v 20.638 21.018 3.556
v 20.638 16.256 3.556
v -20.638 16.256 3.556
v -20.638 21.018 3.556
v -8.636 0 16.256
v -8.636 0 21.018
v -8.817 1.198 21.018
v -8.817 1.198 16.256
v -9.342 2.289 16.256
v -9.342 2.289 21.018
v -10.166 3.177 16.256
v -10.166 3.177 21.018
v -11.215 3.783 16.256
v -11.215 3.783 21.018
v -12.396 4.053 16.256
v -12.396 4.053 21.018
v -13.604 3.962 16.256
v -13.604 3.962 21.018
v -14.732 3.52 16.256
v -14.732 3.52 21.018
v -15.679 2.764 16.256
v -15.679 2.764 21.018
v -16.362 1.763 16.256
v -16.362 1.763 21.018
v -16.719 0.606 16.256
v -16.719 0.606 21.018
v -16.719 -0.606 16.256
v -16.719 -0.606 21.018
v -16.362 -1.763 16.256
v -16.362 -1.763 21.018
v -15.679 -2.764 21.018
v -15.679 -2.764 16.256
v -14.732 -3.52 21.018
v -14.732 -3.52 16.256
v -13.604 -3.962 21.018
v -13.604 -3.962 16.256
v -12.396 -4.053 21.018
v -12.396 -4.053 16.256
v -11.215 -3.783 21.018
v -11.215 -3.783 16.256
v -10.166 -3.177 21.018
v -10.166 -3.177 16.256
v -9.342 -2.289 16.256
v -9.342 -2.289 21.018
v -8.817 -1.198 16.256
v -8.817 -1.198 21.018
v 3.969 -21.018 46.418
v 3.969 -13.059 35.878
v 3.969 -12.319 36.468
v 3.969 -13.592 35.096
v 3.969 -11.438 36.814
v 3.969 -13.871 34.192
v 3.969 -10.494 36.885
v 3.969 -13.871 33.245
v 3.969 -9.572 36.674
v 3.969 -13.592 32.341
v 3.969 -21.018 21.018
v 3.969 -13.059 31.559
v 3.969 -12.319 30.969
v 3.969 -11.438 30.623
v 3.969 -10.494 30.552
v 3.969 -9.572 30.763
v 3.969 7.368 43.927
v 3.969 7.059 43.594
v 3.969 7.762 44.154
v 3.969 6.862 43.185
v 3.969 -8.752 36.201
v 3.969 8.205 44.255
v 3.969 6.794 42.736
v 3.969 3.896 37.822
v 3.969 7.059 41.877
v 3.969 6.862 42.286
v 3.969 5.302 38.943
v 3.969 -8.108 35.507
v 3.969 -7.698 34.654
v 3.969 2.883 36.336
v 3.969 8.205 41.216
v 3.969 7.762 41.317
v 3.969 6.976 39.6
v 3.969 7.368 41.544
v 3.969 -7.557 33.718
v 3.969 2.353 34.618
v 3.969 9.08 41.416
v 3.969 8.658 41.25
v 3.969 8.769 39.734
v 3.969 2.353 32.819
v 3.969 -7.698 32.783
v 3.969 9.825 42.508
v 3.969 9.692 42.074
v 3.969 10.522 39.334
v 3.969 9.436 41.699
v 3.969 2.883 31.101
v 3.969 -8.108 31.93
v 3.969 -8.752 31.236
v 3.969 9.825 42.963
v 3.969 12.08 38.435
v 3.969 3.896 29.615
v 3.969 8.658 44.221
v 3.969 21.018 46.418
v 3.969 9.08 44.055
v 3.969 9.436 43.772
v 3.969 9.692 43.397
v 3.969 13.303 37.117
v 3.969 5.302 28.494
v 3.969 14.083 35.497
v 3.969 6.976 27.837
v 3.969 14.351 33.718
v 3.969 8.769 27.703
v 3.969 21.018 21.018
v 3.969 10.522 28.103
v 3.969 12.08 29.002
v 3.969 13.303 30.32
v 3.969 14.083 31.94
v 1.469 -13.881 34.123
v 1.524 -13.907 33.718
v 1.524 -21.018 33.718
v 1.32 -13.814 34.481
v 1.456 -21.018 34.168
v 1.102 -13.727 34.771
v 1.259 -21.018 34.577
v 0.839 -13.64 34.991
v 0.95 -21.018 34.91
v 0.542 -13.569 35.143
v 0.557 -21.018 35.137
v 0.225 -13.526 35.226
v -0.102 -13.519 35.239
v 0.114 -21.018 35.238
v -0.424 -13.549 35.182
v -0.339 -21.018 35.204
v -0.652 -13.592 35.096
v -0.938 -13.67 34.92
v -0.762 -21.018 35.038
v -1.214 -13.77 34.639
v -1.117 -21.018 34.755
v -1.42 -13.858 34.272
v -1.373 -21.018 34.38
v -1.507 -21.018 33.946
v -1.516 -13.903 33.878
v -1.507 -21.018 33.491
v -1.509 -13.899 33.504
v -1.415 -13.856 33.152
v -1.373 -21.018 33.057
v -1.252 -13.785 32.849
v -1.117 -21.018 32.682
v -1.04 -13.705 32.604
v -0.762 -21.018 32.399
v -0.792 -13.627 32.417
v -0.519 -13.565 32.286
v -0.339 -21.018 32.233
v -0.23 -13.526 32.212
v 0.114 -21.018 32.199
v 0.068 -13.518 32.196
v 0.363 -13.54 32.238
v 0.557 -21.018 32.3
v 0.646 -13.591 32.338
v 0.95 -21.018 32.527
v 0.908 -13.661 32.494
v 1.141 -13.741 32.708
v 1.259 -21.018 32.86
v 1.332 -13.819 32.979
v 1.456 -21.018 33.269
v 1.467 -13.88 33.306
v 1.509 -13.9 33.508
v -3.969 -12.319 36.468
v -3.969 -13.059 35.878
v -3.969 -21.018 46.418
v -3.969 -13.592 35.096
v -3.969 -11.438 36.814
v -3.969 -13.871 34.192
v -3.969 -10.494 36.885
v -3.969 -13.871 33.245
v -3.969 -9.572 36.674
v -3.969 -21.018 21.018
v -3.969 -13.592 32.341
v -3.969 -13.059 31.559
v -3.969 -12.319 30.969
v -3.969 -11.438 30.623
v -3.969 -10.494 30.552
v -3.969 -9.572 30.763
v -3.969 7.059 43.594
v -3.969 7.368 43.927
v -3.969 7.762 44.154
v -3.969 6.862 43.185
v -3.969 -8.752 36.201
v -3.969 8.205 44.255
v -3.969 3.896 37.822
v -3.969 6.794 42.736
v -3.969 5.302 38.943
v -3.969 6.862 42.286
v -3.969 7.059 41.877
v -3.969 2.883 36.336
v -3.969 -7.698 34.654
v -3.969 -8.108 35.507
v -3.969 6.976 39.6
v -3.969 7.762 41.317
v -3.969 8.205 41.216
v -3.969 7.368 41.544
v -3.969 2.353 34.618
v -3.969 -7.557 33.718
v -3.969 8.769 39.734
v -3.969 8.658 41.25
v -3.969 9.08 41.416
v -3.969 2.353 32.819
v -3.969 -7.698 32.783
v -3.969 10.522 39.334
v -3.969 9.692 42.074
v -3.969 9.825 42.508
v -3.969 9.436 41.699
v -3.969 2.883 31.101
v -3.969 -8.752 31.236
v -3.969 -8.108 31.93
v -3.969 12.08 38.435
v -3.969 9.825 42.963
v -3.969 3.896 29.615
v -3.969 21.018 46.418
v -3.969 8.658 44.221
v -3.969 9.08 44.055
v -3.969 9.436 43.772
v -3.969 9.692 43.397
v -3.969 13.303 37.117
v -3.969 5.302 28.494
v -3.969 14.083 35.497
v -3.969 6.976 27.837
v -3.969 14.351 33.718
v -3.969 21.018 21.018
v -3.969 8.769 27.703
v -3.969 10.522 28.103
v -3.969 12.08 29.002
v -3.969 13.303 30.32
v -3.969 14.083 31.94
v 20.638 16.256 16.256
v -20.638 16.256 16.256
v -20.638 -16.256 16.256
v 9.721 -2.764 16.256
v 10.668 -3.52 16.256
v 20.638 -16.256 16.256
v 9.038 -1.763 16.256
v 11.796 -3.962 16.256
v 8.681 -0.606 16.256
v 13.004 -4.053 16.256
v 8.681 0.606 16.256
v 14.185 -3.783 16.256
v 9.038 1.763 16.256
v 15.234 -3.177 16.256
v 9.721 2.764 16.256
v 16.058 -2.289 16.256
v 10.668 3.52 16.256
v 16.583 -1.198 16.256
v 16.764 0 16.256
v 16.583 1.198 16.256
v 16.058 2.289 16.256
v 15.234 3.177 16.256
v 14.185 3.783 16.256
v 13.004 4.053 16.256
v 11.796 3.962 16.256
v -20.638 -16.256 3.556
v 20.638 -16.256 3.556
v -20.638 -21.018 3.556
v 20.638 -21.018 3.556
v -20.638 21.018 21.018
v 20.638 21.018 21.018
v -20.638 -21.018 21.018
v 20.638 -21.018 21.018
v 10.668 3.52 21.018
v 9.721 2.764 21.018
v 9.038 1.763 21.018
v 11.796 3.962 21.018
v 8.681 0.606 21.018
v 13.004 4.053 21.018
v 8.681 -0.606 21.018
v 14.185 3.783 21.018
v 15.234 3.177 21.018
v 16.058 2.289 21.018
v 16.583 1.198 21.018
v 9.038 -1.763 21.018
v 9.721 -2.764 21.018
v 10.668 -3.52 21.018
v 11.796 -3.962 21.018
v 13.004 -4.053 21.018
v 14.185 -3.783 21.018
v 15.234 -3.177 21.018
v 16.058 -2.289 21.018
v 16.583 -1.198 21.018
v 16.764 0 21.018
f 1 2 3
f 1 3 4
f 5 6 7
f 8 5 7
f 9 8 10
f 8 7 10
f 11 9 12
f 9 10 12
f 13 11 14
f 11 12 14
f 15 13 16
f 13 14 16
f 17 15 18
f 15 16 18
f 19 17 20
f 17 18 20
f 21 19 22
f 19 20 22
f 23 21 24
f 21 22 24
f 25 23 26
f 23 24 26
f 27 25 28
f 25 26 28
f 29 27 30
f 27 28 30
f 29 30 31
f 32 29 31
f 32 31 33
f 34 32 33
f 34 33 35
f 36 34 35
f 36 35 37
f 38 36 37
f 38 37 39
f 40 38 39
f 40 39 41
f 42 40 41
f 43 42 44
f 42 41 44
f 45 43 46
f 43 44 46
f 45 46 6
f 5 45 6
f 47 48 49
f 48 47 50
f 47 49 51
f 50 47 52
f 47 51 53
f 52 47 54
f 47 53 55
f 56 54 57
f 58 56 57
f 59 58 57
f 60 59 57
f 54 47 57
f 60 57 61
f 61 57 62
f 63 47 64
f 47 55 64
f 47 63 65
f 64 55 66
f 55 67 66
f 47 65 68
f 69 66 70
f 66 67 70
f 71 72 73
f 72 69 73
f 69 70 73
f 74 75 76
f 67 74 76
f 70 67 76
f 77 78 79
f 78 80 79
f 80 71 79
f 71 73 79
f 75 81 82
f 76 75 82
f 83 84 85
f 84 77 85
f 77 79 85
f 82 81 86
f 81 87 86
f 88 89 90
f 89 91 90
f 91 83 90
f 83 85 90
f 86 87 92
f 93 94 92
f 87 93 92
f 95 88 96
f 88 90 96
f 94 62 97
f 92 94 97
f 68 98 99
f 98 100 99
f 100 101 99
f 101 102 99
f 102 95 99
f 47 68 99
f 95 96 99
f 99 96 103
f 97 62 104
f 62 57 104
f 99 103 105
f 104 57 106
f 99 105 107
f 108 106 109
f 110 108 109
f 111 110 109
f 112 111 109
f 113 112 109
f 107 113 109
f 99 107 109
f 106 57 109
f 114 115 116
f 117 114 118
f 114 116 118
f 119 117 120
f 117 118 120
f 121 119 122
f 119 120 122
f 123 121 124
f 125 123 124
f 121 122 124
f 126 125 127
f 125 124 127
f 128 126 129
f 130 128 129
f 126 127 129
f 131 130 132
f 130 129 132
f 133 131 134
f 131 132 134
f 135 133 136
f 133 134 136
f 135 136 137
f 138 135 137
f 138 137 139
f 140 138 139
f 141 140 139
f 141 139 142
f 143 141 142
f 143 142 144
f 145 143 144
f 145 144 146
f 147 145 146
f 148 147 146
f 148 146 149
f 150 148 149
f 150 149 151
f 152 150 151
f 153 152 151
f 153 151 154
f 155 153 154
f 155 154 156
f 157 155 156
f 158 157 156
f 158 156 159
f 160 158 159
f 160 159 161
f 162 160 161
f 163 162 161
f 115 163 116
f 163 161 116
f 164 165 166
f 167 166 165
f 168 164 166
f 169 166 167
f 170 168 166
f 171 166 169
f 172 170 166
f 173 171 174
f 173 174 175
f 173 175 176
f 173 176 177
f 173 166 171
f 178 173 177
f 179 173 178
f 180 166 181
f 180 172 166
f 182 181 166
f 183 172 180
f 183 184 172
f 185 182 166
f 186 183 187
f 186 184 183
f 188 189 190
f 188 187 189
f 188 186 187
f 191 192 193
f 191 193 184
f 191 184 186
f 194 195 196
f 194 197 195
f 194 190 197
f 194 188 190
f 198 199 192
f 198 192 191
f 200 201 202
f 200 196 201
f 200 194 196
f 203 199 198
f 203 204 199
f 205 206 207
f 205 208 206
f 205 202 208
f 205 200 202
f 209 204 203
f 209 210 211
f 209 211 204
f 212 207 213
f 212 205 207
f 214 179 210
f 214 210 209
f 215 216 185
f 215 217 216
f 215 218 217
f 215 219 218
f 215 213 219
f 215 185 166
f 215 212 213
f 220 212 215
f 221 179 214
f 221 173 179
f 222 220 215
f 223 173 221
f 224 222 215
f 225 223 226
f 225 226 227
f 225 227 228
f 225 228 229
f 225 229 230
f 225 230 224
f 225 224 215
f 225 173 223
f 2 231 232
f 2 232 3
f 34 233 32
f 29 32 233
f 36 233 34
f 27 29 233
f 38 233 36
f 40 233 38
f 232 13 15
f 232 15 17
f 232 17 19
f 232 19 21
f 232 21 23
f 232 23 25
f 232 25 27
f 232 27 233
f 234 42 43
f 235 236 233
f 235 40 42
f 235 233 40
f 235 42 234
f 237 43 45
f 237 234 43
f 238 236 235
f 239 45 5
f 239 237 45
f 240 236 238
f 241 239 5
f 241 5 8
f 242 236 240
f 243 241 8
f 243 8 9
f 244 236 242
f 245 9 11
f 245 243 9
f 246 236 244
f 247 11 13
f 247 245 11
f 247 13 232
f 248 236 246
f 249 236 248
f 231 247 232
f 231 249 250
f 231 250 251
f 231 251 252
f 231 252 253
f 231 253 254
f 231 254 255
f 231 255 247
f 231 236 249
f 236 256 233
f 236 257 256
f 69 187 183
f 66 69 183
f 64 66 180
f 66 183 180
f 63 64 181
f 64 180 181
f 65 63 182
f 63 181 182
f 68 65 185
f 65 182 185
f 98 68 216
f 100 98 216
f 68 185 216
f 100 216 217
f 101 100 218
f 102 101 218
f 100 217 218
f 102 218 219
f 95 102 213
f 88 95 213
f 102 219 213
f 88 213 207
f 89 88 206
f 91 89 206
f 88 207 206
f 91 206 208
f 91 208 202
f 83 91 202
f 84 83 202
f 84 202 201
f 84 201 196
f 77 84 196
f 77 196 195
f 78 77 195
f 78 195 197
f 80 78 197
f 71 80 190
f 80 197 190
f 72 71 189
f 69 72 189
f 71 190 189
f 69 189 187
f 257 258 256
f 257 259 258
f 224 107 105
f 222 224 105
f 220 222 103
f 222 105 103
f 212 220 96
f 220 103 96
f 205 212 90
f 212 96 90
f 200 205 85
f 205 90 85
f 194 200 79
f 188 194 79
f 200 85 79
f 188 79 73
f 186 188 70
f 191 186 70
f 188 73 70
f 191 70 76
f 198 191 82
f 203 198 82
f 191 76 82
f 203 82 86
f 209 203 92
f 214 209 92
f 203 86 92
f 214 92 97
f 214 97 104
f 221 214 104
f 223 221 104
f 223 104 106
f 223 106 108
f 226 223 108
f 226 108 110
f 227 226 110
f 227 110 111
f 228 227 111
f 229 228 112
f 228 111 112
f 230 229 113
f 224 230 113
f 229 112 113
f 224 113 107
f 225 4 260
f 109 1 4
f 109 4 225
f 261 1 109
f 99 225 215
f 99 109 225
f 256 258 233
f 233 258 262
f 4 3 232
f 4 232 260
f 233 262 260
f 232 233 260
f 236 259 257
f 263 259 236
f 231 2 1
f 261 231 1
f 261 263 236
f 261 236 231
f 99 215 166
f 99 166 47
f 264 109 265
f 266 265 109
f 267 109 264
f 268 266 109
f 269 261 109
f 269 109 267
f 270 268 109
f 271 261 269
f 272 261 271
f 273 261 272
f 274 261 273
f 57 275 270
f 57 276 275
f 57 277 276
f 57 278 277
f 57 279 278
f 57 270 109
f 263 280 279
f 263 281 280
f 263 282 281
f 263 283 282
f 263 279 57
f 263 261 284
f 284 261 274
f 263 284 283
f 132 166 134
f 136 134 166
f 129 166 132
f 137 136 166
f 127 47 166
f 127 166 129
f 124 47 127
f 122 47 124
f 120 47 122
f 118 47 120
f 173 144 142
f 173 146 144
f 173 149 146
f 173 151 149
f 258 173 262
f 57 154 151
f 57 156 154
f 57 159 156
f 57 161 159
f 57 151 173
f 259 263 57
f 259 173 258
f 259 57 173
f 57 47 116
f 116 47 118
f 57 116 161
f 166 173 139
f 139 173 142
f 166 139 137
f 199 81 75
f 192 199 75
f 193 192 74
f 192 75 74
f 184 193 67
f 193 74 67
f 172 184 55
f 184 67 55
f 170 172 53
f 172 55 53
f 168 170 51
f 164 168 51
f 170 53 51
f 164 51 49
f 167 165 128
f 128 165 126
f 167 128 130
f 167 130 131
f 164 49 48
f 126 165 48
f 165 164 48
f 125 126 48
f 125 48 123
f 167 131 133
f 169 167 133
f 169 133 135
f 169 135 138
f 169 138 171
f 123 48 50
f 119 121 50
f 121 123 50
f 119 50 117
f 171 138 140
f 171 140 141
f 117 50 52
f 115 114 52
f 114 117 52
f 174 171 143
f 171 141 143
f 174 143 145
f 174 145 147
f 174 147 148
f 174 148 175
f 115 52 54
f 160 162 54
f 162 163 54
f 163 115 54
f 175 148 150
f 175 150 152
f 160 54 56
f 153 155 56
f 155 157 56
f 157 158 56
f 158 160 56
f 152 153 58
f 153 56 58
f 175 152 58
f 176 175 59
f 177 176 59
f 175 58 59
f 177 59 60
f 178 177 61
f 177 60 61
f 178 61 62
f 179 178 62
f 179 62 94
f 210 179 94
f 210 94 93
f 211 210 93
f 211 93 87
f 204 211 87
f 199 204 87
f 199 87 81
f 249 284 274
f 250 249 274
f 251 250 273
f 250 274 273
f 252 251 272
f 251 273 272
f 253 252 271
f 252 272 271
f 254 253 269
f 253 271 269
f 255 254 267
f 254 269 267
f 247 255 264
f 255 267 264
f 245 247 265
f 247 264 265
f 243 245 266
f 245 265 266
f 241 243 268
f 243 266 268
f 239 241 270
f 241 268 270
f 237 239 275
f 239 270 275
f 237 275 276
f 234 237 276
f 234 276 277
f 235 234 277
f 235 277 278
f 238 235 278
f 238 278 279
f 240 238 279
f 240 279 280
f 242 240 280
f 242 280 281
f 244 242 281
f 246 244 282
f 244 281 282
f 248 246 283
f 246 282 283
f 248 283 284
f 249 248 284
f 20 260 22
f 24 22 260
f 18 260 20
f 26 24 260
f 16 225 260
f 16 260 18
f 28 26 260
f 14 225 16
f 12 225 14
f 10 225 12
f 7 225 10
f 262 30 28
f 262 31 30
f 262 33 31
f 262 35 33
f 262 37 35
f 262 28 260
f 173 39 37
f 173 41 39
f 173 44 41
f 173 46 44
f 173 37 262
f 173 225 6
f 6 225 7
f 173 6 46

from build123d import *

# Parameters (mm, degrees)
F1_DEPTH  = 20.6375
F2_R      = 4.064
F3_DEPTH  = 4.7625
F4_W      = 7.9375
F4_H      = 42.037
F5_DEPTH  = 25.4
F6_R      = 6.0325
F6_R_2    = 3.175
F7_DEPTH  = 7.9375
F8_R      = 1.524
F9_DEPTH  = 7.9375
F10_R     = 1.524
F11_DEPTH = 7.5026726507


with BuildPart() as f1:
    # F0 (on Right) → F1 (new body, symmetric)
    with BuildSketch(Plane.YZ):
        Polygon((-16.256, 3.556), (-16.256, 16.256), (16.256, 16.256), (16.256, 3.556), (21.0185, 3.556), (21.0185, 21.0185), (-21.0185, 21.0185), (-21.0185, 3.556), align=None)
    extrude(amount=F1_DEPTH, both=True)

    # F2 (on face) → F3 (cut, through all)
    with BuildSketch(Plane.XY.offset(21.0185)):
        with Locations((-12.7, 0)):
            Circle(F2_R)
        with Locations((12.7, 0)):
            Circle(F2_R)
    extrude(amount=-F3_DEPTH, mode=Mode.SUBTRACT)

    # F4 (on face) → F5 (join)
    with BuildSketch(Plane.XY.offset(21.0185)):
        Rectangle(F4_W, F4_H)
    extrude(amount=F5_DEPTH)

    # F6 (on face) → F7 (cut, through all)
    with BuildSketch(Plane.YZ.offset(3.96875)):
        with Locations((8.3185, 33.7185)):
            Circle(F6_R)
        with Locations((-10.7315, 33.7185)):
            Circle(F6_R_2)
    extrude(amount=-F7_DEPTH, mode=Mode.SUBTRACT)

    # F8 (on face) → F9 (cut, through all)
    with BuildSketch(Plane(origin=(-3.96875, 0, 0), x_dir=(0, -1, 0), z_dir=(-1, 0, 0))):
        with Locations((-8.3185, 42.7355)):
            Circle(F8_R)
    extrude(amount=-F9_DEPTH, mode=Mode.SUBTRACT)

    # F10 (on face) → F11 (cut, through all)
    with BuildSketch(Plane.XZ.offset(21.0185)):
        with Locations((0, 33.7185)):
            Circle(F10_R)
    extrude(amount=-F11_DEPTH, mode=Mode.SUBTRACT)


solid = f1.part
